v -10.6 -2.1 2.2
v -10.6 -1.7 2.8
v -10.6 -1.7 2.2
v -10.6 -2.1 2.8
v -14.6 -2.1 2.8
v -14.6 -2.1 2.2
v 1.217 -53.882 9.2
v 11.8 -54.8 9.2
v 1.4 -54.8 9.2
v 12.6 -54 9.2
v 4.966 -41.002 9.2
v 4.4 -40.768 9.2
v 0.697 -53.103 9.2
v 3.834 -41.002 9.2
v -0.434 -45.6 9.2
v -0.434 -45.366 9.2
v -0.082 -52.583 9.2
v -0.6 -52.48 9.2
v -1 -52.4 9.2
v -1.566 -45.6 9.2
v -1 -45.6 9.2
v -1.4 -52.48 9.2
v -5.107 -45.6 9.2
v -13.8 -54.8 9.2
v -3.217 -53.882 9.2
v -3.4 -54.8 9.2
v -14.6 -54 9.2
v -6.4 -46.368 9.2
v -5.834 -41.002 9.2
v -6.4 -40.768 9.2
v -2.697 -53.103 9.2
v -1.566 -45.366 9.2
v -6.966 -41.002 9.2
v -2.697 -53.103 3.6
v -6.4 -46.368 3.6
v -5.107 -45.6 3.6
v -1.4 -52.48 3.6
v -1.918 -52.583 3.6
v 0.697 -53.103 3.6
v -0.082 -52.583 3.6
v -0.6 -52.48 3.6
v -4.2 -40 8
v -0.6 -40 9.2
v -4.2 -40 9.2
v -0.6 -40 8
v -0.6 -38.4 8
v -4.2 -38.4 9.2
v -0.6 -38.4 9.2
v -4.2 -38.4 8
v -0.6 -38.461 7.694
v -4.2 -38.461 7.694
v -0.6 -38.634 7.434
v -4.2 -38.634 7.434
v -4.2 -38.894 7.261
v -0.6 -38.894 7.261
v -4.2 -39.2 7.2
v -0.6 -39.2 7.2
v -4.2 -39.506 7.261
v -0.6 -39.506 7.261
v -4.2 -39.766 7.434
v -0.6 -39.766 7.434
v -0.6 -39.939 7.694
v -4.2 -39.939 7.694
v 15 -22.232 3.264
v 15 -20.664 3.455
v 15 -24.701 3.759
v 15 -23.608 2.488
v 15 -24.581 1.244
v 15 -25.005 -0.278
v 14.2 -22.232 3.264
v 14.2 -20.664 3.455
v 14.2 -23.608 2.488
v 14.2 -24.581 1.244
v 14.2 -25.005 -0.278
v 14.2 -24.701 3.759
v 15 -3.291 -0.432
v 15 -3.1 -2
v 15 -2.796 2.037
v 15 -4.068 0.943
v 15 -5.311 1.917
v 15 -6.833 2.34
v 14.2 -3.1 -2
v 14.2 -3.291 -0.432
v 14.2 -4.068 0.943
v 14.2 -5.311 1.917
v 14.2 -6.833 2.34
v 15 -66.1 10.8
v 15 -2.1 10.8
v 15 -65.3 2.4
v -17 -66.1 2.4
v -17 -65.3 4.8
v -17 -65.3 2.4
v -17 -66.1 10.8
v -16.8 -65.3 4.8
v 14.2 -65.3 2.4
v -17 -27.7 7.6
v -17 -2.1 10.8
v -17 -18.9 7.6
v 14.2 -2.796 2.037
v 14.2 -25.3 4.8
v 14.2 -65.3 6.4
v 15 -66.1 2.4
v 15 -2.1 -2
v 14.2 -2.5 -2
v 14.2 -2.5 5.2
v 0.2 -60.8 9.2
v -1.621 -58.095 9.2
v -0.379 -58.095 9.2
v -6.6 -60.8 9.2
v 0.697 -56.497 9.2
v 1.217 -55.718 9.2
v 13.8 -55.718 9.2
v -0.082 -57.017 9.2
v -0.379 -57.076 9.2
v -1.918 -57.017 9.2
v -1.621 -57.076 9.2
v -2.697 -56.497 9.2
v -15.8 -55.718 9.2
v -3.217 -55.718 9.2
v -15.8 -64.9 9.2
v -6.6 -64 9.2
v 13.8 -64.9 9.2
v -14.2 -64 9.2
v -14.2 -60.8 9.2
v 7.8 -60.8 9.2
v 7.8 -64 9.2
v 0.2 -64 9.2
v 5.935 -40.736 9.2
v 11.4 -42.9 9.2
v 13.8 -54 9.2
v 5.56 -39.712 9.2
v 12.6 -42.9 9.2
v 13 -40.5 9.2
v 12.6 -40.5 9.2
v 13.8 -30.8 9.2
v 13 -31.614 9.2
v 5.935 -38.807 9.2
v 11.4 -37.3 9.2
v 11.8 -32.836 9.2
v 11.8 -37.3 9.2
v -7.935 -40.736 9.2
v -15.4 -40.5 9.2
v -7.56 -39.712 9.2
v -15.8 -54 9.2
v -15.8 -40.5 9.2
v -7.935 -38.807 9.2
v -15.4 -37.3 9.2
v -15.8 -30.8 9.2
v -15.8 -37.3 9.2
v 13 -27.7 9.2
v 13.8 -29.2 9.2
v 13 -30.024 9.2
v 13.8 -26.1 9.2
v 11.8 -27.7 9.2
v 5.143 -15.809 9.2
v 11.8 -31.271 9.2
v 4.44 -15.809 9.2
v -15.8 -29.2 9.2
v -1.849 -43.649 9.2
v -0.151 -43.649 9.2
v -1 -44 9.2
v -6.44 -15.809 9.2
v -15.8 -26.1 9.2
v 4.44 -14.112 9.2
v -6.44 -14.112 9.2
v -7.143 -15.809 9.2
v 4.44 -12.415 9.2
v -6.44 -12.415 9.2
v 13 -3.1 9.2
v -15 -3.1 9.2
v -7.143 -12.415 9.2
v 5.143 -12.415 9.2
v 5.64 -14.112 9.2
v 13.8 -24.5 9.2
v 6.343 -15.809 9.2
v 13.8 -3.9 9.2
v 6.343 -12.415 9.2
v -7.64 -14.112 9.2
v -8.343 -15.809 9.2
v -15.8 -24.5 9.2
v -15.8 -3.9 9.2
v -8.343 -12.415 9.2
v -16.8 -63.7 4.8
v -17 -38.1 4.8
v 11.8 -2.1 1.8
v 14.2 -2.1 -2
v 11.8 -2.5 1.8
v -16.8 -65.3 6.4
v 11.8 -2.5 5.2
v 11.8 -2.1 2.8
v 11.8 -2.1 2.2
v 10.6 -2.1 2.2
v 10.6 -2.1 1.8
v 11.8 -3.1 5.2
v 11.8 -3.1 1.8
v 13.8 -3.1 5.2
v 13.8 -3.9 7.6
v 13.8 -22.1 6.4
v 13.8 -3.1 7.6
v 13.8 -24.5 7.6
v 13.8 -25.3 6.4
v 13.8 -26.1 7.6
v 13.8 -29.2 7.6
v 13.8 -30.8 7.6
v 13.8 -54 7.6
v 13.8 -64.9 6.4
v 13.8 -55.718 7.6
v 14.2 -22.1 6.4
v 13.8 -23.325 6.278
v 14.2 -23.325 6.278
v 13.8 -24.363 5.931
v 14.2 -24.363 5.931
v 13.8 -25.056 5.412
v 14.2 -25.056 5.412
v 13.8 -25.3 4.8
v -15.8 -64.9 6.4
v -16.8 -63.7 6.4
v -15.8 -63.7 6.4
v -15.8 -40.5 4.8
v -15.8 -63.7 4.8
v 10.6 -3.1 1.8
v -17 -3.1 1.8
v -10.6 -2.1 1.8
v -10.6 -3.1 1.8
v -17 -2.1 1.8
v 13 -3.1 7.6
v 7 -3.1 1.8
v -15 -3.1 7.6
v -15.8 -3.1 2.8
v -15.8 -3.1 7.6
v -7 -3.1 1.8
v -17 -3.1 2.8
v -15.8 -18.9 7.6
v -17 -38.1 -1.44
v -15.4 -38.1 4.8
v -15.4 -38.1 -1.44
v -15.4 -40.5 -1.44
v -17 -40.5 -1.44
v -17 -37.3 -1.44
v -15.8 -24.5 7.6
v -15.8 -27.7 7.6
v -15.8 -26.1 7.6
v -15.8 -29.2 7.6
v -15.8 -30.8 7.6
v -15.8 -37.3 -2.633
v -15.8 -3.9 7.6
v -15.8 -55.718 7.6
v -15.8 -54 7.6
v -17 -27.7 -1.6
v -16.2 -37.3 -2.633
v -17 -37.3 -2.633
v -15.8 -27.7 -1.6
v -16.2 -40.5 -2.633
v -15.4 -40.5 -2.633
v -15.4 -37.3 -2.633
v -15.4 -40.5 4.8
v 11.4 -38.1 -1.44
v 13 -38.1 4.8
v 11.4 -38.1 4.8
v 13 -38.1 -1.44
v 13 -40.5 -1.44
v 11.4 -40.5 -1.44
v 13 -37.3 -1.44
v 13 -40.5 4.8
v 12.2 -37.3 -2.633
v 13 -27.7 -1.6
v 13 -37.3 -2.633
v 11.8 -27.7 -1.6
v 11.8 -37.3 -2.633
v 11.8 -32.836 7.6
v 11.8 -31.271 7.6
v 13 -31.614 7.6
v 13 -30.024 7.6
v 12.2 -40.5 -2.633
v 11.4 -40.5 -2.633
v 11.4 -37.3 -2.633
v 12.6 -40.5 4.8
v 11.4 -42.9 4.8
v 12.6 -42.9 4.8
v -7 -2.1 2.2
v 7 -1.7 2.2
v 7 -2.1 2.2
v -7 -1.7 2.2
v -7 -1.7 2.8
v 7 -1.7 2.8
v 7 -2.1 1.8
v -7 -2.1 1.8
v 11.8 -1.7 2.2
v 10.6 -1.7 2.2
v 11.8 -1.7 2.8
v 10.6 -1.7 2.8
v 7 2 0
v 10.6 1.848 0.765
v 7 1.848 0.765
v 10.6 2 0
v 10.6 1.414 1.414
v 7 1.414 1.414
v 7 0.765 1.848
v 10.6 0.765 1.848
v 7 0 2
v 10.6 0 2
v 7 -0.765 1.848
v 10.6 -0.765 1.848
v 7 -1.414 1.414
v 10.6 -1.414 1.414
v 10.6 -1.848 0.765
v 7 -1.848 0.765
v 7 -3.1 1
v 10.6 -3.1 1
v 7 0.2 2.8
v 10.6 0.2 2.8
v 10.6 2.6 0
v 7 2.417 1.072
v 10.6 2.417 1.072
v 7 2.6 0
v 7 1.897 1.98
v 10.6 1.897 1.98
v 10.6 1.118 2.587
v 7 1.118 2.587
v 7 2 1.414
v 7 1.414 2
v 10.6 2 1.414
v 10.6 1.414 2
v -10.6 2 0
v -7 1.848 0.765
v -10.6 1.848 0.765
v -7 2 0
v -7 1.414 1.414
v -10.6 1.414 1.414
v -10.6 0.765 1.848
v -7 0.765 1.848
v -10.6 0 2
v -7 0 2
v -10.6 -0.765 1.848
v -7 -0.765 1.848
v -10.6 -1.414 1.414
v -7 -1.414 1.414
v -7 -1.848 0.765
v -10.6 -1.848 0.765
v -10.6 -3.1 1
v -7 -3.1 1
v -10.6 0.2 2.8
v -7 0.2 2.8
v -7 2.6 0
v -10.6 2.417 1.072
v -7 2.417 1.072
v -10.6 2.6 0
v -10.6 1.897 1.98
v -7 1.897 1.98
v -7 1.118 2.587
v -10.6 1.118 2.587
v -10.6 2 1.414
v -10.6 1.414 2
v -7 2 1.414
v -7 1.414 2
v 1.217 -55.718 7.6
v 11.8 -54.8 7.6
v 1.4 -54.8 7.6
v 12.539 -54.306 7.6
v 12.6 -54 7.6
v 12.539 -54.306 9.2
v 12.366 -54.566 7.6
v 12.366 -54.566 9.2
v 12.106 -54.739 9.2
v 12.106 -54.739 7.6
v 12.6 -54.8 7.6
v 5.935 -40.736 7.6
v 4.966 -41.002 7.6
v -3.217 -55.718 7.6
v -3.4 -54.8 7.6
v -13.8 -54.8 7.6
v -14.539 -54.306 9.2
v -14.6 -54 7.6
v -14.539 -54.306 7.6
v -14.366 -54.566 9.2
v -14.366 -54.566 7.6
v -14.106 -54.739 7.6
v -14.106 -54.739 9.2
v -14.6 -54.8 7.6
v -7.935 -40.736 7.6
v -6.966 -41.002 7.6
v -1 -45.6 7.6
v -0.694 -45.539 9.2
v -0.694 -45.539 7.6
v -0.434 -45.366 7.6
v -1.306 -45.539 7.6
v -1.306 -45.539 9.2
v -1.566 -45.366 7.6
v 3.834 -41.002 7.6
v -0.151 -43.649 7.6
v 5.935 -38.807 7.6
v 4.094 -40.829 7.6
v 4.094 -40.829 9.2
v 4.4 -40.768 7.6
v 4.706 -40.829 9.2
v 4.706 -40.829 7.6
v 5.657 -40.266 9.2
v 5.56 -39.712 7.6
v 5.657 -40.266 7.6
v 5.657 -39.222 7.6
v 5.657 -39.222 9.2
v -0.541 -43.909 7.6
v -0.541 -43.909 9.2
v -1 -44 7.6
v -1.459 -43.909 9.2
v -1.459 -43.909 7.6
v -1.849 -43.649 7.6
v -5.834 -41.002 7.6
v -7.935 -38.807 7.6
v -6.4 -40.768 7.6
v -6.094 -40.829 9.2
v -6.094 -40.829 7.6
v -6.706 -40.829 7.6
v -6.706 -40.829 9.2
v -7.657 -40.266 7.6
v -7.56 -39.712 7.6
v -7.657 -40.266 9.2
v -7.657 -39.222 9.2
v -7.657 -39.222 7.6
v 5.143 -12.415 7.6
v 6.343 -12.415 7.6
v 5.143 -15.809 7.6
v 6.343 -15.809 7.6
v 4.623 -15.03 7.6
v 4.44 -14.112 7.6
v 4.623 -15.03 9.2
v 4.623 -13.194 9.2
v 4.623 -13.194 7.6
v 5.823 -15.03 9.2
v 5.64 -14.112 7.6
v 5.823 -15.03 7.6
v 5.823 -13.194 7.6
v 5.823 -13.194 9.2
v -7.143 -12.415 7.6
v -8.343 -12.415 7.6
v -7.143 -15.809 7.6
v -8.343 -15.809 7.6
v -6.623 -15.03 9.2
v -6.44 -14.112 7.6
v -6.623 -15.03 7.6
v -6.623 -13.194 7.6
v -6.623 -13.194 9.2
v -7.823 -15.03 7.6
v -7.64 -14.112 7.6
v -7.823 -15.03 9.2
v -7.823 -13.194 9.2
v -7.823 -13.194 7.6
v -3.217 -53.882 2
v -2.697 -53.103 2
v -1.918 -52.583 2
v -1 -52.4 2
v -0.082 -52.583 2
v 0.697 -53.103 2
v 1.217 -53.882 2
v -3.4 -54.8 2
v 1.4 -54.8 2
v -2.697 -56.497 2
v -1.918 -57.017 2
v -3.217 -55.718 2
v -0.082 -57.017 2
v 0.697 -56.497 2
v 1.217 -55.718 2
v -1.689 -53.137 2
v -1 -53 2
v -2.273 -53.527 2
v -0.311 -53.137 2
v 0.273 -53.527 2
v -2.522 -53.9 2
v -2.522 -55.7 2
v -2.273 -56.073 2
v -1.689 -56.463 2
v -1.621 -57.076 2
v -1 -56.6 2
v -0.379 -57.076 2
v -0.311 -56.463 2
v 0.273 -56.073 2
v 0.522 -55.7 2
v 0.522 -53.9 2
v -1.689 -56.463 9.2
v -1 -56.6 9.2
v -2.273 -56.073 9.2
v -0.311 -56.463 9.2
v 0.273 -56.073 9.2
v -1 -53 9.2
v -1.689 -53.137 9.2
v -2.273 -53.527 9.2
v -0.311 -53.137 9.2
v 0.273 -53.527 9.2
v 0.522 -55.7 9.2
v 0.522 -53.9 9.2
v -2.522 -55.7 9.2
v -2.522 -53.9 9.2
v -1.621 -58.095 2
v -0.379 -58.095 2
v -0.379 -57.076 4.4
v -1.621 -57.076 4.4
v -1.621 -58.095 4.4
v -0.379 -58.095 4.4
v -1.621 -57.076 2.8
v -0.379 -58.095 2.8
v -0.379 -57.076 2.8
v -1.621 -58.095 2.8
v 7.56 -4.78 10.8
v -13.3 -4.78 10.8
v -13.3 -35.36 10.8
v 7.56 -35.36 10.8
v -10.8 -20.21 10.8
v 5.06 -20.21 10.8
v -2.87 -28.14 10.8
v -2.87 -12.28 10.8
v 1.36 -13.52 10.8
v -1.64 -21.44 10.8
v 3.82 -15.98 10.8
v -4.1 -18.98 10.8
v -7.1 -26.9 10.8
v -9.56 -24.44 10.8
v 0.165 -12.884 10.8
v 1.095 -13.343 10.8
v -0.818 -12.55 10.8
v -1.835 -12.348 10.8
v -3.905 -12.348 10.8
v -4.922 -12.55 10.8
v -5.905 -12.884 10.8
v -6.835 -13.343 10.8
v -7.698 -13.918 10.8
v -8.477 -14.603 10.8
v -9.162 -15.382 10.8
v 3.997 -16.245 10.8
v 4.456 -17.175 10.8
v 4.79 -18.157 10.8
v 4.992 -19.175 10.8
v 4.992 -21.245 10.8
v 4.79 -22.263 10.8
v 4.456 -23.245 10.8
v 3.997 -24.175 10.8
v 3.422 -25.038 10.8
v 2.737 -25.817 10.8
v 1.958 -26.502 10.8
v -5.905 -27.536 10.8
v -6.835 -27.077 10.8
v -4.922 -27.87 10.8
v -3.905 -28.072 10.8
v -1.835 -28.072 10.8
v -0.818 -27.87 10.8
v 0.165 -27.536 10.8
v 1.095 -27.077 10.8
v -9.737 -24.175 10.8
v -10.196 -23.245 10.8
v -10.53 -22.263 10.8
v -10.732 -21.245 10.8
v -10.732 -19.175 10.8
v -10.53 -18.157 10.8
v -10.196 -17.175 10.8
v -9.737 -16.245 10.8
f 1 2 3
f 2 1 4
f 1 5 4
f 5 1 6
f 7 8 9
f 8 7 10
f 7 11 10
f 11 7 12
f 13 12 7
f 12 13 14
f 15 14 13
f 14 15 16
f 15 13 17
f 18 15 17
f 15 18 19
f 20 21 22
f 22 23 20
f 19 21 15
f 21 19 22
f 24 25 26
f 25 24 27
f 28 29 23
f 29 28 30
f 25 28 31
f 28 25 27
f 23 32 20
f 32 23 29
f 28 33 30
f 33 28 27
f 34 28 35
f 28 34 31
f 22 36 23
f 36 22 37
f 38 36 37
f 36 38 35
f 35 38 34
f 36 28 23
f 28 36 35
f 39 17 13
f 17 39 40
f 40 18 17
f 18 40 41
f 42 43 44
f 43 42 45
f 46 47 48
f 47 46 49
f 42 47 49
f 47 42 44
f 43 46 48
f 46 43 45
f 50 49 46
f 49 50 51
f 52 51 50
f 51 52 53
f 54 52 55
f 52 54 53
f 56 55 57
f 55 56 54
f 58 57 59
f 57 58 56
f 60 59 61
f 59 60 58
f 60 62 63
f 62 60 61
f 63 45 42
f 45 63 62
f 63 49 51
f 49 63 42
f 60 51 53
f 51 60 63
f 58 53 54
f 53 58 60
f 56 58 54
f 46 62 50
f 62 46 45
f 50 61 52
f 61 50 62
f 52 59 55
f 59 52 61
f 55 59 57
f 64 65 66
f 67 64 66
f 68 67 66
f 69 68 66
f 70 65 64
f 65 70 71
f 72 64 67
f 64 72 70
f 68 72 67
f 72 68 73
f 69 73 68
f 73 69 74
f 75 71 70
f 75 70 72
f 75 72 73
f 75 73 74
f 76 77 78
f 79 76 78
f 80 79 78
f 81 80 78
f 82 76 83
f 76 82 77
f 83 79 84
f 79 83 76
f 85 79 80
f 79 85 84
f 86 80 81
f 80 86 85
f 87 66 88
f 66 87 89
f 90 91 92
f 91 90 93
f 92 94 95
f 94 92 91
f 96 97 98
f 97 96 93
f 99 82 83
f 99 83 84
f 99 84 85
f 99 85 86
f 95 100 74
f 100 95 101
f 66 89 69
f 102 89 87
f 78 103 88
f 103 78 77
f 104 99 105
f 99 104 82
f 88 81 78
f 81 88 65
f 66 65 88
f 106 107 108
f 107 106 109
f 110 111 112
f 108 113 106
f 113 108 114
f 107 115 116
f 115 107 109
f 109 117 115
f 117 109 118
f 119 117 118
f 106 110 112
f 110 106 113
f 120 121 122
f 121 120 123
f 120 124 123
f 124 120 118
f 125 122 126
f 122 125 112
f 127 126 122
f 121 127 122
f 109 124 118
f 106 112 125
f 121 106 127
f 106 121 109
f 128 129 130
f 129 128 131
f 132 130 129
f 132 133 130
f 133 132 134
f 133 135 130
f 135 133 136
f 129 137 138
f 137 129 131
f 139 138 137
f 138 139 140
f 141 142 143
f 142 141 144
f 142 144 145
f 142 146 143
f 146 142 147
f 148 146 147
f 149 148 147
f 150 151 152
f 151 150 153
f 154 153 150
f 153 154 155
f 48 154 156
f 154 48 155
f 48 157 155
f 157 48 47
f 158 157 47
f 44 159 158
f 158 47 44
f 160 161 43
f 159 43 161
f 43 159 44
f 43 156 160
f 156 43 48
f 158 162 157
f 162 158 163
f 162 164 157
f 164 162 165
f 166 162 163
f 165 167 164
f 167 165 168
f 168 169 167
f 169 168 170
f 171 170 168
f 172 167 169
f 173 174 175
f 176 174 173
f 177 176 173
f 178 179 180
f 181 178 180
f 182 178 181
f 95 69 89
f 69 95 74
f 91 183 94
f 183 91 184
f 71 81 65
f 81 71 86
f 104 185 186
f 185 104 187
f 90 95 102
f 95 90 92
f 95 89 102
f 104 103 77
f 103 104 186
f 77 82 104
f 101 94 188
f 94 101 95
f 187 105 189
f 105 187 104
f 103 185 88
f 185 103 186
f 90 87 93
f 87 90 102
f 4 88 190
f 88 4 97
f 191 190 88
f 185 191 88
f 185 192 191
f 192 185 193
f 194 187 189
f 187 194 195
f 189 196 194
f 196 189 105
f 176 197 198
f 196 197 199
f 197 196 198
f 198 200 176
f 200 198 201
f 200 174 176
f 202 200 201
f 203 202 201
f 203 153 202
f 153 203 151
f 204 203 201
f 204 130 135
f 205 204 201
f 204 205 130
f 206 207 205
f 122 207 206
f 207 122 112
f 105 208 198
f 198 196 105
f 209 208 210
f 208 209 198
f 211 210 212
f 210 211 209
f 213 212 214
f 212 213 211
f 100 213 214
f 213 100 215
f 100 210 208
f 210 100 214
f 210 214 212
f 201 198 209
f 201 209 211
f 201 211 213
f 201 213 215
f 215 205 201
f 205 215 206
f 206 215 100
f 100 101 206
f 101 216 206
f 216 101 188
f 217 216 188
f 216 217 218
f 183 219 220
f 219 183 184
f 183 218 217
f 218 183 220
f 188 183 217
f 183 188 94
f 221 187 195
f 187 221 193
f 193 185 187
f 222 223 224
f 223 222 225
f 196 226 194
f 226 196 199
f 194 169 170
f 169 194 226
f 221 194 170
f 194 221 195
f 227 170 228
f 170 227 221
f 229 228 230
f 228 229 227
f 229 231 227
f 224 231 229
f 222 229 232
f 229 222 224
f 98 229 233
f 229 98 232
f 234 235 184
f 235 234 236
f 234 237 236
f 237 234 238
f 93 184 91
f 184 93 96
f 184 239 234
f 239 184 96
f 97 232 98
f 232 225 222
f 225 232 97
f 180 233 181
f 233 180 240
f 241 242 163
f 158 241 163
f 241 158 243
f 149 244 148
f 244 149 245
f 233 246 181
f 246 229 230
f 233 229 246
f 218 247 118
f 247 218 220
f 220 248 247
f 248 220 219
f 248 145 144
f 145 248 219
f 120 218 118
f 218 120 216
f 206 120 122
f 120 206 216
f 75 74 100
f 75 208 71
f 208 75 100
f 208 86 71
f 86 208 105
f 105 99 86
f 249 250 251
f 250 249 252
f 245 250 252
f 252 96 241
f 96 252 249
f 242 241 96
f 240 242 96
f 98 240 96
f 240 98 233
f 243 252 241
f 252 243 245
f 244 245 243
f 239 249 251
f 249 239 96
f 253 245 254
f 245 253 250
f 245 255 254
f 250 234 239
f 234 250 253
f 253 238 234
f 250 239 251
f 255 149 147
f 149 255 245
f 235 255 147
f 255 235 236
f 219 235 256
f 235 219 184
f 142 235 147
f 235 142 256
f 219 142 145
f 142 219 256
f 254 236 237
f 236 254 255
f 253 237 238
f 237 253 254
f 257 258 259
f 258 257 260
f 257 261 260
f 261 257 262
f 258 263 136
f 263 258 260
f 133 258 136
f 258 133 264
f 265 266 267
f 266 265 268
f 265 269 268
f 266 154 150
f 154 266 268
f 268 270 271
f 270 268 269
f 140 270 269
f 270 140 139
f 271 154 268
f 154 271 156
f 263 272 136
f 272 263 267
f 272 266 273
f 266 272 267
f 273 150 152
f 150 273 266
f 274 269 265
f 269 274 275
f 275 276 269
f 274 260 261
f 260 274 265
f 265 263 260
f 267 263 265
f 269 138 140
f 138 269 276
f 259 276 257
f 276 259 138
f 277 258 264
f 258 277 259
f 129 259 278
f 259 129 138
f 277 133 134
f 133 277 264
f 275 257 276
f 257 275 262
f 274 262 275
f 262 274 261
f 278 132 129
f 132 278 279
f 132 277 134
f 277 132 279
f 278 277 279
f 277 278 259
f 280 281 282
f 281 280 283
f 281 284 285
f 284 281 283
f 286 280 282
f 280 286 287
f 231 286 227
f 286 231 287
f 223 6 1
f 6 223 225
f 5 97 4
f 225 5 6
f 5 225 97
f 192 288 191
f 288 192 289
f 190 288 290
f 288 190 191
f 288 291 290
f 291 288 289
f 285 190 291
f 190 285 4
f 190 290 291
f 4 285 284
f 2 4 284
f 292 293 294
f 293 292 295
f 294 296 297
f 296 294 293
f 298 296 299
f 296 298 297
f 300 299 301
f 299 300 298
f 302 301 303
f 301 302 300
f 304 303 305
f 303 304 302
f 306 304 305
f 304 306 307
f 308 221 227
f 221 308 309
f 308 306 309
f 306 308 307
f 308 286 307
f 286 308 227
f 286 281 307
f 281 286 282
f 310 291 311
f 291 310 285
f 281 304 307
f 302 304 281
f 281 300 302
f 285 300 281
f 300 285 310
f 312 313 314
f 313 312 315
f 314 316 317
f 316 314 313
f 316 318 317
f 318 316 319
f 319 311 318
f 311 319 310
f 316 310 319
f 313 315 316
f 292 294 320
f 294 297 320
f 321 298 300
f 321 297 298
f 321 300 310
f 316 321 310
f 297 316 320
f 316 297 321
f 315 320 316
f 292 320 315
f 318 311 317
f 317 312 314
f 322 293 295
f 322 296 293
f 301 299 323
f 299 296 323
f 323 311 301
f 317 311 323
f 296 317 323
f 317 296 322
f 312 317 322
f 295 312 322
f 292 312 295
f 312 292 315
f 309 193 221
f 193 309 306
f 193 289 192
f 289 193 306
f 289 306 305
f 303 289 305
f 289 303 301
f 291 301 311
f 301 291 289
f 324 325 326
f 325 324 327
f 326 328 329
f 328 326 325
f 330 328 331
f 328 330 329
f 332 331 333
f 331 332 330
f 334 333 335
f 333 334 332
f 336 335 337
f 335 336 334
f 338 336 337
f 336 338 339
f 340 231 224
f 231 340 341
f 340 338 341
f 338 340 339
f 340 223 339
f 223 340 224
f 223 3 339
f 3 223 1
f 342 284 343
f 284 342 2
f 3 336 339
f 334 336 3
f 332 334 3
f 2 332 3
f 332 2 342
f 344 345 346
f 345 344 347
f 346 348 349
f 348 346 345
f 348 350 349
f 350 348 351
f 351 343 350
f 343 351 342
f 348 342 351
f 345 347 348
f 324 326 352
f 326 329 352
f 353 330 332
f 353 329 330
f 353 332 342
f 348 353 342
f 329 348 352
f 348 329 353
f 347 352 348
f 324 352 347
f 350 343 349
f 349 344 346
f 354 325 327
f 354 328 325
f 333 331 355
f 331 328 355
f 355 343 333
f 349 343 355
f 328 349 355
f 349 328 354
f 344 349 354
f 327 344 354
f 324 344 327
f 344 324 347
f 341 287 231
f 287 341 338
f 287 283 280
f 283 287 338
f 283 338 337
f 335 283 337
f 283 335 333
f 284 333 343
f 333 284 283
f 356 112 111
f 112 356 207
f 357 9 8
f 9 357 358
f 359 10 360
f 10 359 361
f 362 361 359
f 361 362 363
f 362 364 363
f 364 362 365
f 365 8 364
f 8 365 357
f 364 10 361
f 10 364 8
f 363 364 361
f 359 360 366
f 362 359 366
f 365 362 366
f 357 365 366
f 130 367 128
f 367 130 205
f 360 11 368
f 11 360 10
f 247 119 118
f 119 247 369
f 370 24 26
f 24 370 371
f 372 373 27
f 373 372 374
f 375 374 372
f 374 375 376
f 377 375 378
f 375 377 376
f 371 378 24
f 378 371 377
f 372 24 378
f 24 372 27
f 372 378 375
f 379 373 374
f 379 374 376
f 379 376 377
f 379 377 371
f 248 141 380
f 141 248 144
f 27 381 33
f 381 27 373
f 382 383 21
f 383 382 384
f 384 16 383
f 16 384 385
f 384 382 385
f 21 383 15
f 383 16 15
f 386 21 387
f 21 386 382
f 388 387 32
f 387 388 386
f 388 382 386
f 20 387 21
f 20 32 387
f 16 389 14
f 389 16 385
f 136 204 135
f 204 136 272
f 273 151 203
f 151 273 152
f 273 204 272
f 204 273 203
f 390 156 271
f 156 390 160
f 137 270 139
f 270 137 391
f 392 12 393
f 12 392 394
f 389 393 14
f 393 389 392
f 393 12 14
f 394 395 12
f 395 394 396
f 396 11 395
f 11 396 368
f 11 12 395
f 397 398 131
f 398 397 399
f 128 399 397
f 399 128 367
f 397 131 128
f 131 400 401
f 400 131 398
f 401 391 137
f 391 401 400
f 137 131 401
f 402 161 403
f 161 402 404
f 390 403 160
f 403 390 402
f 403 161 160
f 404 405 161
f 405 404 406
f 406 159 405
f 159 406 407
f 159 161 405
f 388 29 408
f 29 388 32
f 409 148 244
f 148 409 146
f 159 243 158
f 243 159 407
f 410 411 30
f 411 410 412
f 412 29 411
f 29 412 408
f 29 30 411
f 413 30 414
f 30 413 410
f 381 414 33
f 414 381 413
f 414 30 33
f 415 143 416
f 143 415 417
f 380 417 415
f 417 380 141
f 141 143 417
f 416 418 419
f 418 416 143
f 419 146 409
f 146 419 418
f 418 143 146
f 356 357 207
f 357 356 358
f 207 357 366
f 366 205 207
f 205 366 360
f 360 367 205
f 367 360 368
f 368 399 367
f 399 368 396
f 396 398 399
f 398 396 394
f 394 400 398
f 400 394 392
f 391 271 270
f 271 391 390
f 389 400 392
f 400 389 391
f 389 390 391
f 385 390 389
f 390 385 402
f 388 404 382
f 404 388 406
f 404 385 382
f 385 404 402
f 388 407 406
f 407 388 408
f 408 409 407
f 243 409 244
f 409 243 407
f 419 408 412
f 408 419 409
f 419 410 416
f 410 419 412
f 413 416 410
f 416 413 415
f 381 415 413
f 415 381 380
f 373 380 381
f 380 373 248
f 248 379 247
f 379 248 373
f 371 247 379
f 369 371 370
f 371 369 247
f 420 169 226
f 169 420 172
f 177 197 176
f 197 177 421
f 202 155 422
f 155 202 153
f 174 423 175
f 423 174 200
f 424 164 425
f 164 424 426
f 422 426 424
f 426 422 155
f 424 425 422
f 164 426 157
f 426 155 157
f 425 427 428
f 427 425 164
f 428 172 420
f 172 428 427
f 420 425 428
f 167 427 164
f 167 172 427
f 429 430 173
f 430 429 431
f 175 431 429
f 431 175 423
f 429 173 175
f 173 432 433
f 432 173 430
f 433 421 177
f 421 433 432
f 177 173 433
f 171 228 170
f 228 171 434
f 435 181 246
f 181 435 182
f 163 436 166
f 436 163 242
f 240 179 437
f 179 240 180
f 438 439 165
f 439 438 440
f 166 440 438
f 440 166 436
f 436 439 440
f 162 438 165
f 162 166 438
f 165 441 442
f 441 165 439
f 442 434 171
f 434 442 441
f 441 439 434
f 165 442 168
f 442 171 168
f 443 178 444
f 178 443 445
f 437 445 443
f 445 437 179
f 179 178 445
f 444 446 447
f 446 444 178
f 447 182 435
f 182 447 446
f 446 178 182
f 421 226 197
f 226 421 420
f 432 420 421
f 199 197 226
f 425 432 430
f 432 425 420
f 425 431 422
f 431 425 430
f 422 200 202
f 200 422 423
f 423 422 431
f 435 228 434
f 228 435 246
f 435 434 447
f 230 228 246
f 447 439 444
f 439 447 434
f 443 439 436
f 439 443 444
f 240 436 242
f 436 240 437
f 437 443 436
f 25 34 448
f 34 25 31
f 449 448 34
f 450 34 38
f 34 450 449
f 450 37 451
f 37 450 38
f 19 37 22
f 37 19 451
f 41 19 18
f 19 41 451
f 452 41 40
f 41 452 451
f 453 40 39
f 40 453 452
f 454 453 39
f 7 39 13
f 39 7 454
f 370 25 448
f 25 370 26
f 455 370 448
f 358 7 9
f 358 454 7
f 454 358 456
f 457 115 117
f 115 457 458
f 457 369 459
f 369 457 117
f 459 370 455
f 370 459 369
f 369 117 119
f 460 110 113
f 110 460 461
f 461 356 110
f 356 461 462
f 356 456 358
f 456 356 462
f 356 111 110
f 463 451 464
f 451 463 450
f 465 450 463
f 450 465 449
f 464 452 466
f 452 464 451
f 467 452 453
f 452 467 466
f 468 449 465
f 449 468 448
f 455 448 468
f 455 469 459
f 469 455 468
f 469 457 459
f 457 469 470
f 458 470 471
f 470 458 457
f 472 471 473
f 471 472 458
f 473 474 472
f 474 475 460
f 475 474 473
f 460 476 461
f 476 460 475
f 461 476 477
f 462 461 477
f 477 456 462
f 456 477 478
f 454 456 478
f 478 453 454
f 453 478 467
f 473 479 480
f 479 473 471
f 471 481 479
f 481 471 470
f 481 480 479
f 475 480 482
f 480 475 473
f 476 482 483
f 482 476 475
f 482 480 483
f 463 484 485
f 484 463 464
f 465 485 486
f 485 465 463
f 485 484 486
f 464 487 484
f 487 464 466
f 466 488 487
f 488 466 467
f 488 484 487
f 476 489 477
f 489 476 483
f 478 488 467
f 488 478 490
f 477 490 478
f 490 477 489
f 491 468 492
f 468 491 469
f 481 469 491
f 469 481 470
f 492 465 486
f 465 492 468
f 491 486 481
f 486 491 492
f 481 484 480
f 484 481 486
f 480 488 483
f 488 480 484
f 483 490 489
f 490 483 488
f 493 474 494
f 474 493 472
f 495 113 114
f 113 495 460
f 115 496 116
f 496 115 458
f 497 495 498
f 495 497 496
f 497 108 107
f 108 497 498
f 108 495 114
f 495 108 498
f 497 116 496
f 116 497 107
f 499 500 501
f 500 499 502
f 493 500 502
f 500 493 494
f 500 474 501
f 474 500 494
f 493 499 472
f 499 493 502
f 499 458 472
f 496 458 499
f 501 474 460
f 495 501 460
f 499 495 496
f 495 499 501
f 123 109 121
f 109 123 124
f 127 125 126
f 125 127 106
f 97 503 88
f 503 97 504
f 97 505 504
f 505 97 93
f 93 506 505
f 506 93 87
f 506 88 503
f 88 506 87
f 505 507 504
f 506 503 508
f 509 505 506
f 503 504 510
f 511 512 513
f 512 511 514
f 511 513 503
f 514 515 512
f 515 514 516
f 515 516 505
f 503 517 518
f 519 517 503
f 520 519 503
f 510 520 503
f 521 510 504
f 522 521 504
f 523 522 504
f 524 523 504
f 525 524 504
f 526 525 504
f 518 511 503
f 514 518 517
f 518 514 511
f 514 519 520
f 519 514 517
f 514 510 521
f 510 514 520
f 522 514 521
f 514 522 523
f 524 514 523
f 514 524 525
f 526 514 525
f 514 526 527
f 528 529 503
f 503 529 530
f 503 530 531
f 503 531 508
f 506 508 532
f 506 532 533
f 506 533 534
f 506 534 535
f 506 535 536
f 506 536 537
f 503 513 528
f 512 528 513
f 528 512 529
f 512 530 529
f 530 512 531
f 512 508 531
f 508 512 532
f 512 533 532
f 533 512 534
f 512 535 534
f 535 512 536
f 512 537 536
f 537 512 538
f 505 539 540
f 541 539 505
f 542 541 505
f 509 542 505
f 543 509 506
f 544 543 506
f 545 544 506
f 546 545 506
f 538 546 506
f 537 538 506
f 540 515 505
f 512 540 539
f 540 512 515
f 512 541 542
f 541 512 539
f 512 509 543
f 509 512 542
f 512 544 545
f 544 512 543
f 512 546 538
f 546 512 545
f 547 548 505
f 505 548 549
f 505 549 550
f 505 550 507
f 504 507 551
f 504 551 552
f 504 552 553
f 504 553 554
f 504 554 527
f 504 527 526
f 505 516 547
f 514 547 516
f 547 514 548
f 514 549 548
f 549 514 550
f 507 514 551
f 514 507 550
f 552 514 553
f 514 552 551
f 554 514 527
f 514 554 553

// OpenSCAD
use <../lib.scad>
use <s/4111s01.scad>
use <s/4112s01.scad>
function ldraw_lib__4111p01() = [
// 0 ~Electric Switch: Key Right with Point Branching Pattern
// 0 Name: 4111p01.dat
// 0 Author: Javier Orquera [kuramapika1]
// 0 !LDRAW_ORG Part UPDATE 2025-09
// 0 !LICENSE Licensed under CC BY 4.0 : see CAreadme.txt
// 
// 0 !HELP to put this part into a pressed-down state, rotate it 4.3 degrees
// 0 !HELP around the x-axis
// 
// 0 BFC CERTIFY CCW
  [0,"BFC","CERTIFY"],
  [0,"BFC","CCW"],
// 
// 0 !KEYWORDS Set 1239, Set 5080, Set 7858, Set 7859, Set 7863, switch, Train
// 
// 0 !HISTORY 2025-04-24 [kuramapika1] Adapted surfaces
// 0 !HISTORY 2025-09-11 [kuramapika1] Use of new subfile
// 0 !HISTORY 2025-09-18 [kuramapika1] Merge vertexes to corners
// 0 !HISTORY 2025-09-29 [OrionP] Official Update 2025-09
// 
// 1 16 0 0 0 1 0 0 0 1 0 0 0 1 s\4111s01.dat
  [1,16,0,0,0,1,0,0,0,1,0,0,0,1, ldraw_lib__s__4111s01()],
// 1 16 0 0 0 -1 0 0 0 1 0 0 0 1 s\4112s01.dat
  [1,16,0,0,0,-1,0,0,0,1,0,0,0,1, ldraw_lib__s__4112s01()],
// 4 16 -42.5 -27 -5.25 -33.25 -27 -11.95 18.9 -27 -11.95 37.5 -27 -5.25
  [4,16,-42.5,-27,-5.25,-33.25,-27,-11.95,18.9,-27,-11.95,37.5,-27,-5.25],
// 4 16 -33.25 -27 -88.4 -33.25 -27 -11.95 -42.5 -27 -5.25 -42.5 -27 -165.25
  [4,16,-33.25,-27,-88.4,-33.25,-27,-11.95,-42.5,-27,-5.25,-42.5,-27,-165.25],
// 4 16 -33.25 -27 -88.4 -42.5 -27 -165.25 37.5 -27 -165.25 18.9 -27 -88.4
  [4,16,-33.25,-27,-88.4,-42.5,-27,-165.25,37.5,-27,-165.25,18.9,-27,-88.4],
// 4 16 37.5 -27 -165.25 37.5 -27 -5.25 18.9 -27 -11.95 18.9 -27 -88.4
  [4,16,37.5,-27,-165.25,37.5,-27,-5.25,18.9,-27,-11.95,18.9,-27,-88.4],
// 3 0 -33.25 -27 -88.4 -26.9994 -27 -50.525 -33.25 -27 -11.95
  [3,0,-33.25,-27,-88.4,-26.9994,-27,-50.525,-33.25,-27,-11.95],
// 3 0 18.9 -27 -88.4 18.9 -27 -11.95 12.6494 -27 -50.525
  [3,0,18.9,-27,-88.4,18.9,-27,-11.95,12.6494,-27,-50.525],
// 3 0 -7.175 -27 -70.35 -33.25 -27 -88.4 18.9 -27 -88.4
  [3,0,-7.175,-27,-70.35,-33.25,-27,-88.4,18.9,-27,-88.4],
// 3 0 18.9 -27 -11.95 -33.25 -27 -11.95 -7.175 -27 -30.7
  [3,0,18.9,-27,-11.95,-33.25,-27,-11.95,-7.175,-27,-30.7],
// 4 0 -10.25091 -27 -47.4491 -4.09909 -27 -53.6009 9.5509 -27 -39.9495 3.4 -27 -33.799
  [4,0,-10.25091,-27,-47.4491,-4.09909,-27,-53.6009,9.5509,-27,-39.9495,3.4,-27,-33.799],
// 3 0 3.4 -27 -33.799 9.5509 -27 -39.9495 18.9 -27 -11.95
  [3,0,3.4,-27,-33.799,9.5509,-27,-39.9495,18.9,-27,-11.95],
// 4 0 -4.09909 -27 -53.6009 -10.25091 -27 -47.4491 -23.9009 -27 -61.1005 -17.75 -27 -67.251
  [4,0,-4.09909,-27,-53.6009,-10.25091,-27,-47.4491,-23.9009,-27,-61.1005,-17.75,-27,-67.251],
// 3 0 -17.75 -27 -67.251 -23.9009 -27 -61.1005 -33.25 -27 -88.4
  [3,0,-17.75,-27,-67.251,-23.9009,-27,-61.1005,-33.25,-27,-88.4],
// 3 0 18.9 -27 -11.95 .41204 -27 -32.209 2.73804 -27 -33.357
  [3,0,18.9,-27,-11.95,.41204,-27,-32.209,2.73804,-27,-33.357],
// 3 0 -2.04395 -27 -31.376 .41204 -27 -32.209 18.9 -27 -11.95
  [3,0,-2.04395,-27,-31.376,.41204,-27,-32.209,18.9,-27,-11.95],
// 3 0 -4.58798 -27 -30.87 -2.04395 -27 -31.376 18.9 -27 -11.95
  [3,0,-4.58798,-27,-30.87,-2.04395,-27,-31.376,18.9,-27,-11.95],
// 3 0 -7.175 -27 -30.7 -4.58798 -27 -30.87 18.9 -27 -11.95
  [3,0,-7.175,-27,-30.7,-4.58798,-27,-30.87,18.9,-27,-11.95],
// 3 0 -9.76202 -27 -30.87 -7.175 -27 -30.7 -33.25 -27 -11.95
  [3,0,-9.76202,-27,-30.87,-7.175,-27,-30.7,-33.25,-27,-11.95],
// 3 0 -12.30605 -27 -31.376 -9.76202 -27 -30.87 -33.25 -27 -11.95
  [3,0,-12.30605,-27,-31.376,-9.76202,-27,-30.87,-33.25,-27,-11.95],
// 3 0 -14.762 -27 -32.209 -12.30605 -27 -31.376 -33.25 -27 -11.95
  [3,0,-14.762,-27,-32.209,-12.30605,-27,-31.376,-33.25,-27,-11.95],
// 3 0 -17.087 -27 -33.3569 -14.762 -27 -32.209 -33.25 -27 -11.95
  [3,0,-17.087,-27,-33.3569,-14.762,-27,-32.209,-33.25,-27,-11.95],
// 3 0 -19.244 -27 -34.796 -17.087 -27 -33.3569 -33.25 -27 -11.95
  [3,0,-19.244,-27,-34.796,-17.087,-27,-33.3569,-33.25,-27,-11.95],
// 3 0 -21.193 -27 -36.507 -19.244 -27 -34.796 -33.25 -27 -11.95
  [3,0,-21.193,-27,-36.507,-19.244,-27,-34.796,-33.25,-27,-11.95],
// 3 0 2.73804 -27 -33.357 3.4 -27 -33.799 18.9 -27 -11.95
  [3,0,2.73804,-27,-33.357,3.4,-27,-33.799,18.9,-27,-11.95],
// 4 15 -10.25091 -27 -47.4491 3.4 -27 -33.799 2.73804 -27 -33.357 .41204 -27 -32.209
  [4,15,-10.25091,-27,-47.4491,3.4,-27,-33.799,2.73804,-27,-33.357,.41204,-27,-32.209],
// 4 15 -10.25091 -27 -47.4491 .41204 -27 -32.209 -2.04395 -27 -31.376 -4.58798 -27 -30.87
  [4,15,-10.25091,-27,-47.4491,.41204,-27,-32.209,-2.04395,-27,-31.376,-4.58798,-27,-30.87],
// 4 15 -10.25091 -27 -47.4491 -4.58798 -27 -30.87 -7.175 -27 -30.7 -9.76202 -27 -30.87
  [4,15,-10.25091,-27,-47.4491,-4.58798,-27,-30.87,-7.175,-27,-30.7,-9.76202,-27,-30.87],
// 4 15 -10.25091 -27 -47.4491 -9.76202 -27 -30.87 -12.30605 -27 -31.376 -14.762 -27 -32.209
  [4,15,-10.25091,-27,-47.4491,-9.76202,-27,-30.87,-12.30605,-27,-31.376,-14.762,-27,-32.209],
// 4 15 -10.25091 -27 -47.4491 -14.762 -27 -32.209 -17.087 -27 -33.3569 -19.244 -27 -34.796
  [4,15,-10.25091,-27,-47.4491,-14.762,-27,-32.209,-17.087,-27,-33.3569,-19.244,-27,-34.796],
// 4 15 -10.25091 -27 -47.4491 -19.244 -27 -34.796 -21.193 -27 -36.507 -22.9039 -27 -38.4561
  [4,15,-10.25091,-27,-47.4491,-19.244,-27,-34.796,-21.193,-27,-36.507,-22.9039,-27,-38.4561],
// 3 0 9.9928 -27 -40.6121 11.1412 -27 -42.9385 18.9 -27 -11.95
  [3,0,9.9928,-27,-40.6121,11.1412,-27,-42.9385,18.9,-27,-11.95],
// 3 0 18.9 -27 -11.95 11.1412 -27 -42.9385 11.9742 -27 -45.3935
  [3,0,18.9,-27,-11.95,11.1412,-27,-42.9385,11.9742,-27,-45.3935],
// 3 0 18.9 -27 -11.95 11.9742 -27 -45.3935 12.4804 -27 -47.9377
  [3,0,18.9,-27,-11.95,11.9742,-27,-45.3935,12.4804,-27,-47.9377],
// 3 0 18.9 -27 -11.95 12.4804 -27 -47.9377 12.6494 -27 -50.525
  [3,0,18.9,-27,-11.95,12.4804,-27,-47.9377,12.6494,-27,-50.525],
// 3 0 18.9 -27 -88.4 12.6494 -27 -50.525 12.4797 -27 -53.1116
  [3,0,18.9,-27,-88.4,12.6494,-27,-50.525,12.4797,-27,-53.1116],
// 3 0 18.9 -27 -88.4 12.4797 -27 -53.1116 11.9742 -27 -55.6565
  [3,0,18.9,-27,-88.4,12.4797,-27,-53.1116,11.9742,-27,-55.6565],
// 3 0 18.9 -27 -88.4 11.9742 -27 -55.6565 11.1412 -27 -58.1115
  [3,0,18.9,-27,-88.4,11.9742,-27,-55.6565,11.1412,-27,-58.1115],
// 3 0 18.9 -27 -88.4 11.1412 -27 -58.1115 9.9928 -27 -60.4365
  [3,0,18.9,-27,-88.4,11.1412,-27,-58.1115,9.9928,-27,-60.4365],
// 3 0 18.9 -27 -88.4 9.9928 -27 -60.4365 8.5539 -27 -62.5939
  [3,0,18.9,-27,-88.4,9.9928,-27,-60.4365,8.5539,-27,-62.5939],
// 3 0 18.9 -27 -88.4 8.5539 -27 -62.5939 6.84268 -27 -64.5427
  [3,0,18.9,-27,-88.4,8.5539,-27,-62.5939,6.84268,-27,-64.5427],
// 3 0 18.9 -27 -11.95 9.5509 -27 -39.9495 9.9928 -27 -40.6121
  [3,0,18.9,-27,-11.95,9.5509,-27,-39.9495,9.9928,-27,-40.6121],
// 4 15 9.9928 -27 -40.6121 9.5509 -27 -39.9495 -4.09909 -27 -53.6009 11.1412 -27 -42.9385
  [4,15,9.9928,-27,-40.6121,9.5509,-27,-39.9495,-4.09909,-27,-53.6009,11.1412,-27,-42.9385],
// 4 15 11.9742 -27 -45.3935 11.1412 -27 -42.9385 -4.09909 -27 -53.6009 12.4804 -27 -47.9377
  [4,15,11.9742,-27,-45.3935,11.1412,-27,-42.9385,-4.09909,-27,-53.6009,12.4804,-27,-47.9377],
// 4 15 12.6494 -27 -50.525 12.4804 -27 -47.9377 -4.09909 -27 -53.6009 12.4797 -27 -53.1116
  [4,15,12.6494,-27,-50.525,12.4804,-27,-47.9377,-4.09909,-27,-53.6009,12.4797,-27,-53.1116],
// 4 15 11.9742 -27 -55.6565 12.4797 -27 -53.1116 -4.09909 -27 -53.6009 11.1412 -27 -58.1115
  [4,15,11.9742,-27,-55.6565,12.4797,-27,-53.1116,-4.09909,-27,-53.6009,11.1412,-27,-58.1115],
// 4 15 9.9928 -27 -60.4365 11.1412 -27 -58.1115 -4.09909 -27 -53.6009 8.5539 -27 -62.5939
  [4,15,9.9928,-27,-60.4365,11.1412,-27,-58.1115,-4.09909,-27,-53.6009,8.5539,-27,-62.5939],
// 4 15 6.84268 -27 -64.5427 8.5539 -27 -62.5939 -4.09909 -27 -53.6009 4.89404 -27 -66.254
  [4,15,6.84268,-27,-64.5427,8.5539,-27,-62.5939,-4.09909,-27,-53.6009,4.89404,-27,-66.254],
// 3 0 -33.25 -27 -88.4 -14.762 -27 -68.841 -17.088 -27 -67.693
  [3,0,-33.25,-27,-88.4,-14.762,-27,-68.841,-17.088,-27,-67.693],
// 3 0 -12.30605 -27 -69.674 -14.762 -27 -68.841 -33.25 -27 -88.4
  [3,0,-12.30605,-27,-69.674,-14.762,-27,-68.841,-33.25,-27,-88.4],
// 3 0 -9.76202 -27 -70.18 -12.30605 -27 -69.674 -33.25 -27 -88.4
  [3,0,-9.76202,-27,-70.18,-12.30605,-27,-69.674,-33.25,-27,-88.4],
// 3 0 -7.175 -27 -70.35 -9.76202 -27 -70.18 -33.25 -27 -88.4
  [3,0,-7.175,-27,-70.35,-9.76202,-27,-70.18,-33.25,-27,-88.4],
// 3 0 -4.58798 -27 -70.18 -7.175 -27 -70.35 18.9 -27 -88.4
  [3,0,-4.58798,-27,-70.18,-7.175,-27,-70.35,18.9,-27,-88.4],
// 3 0 -2.04395 -27 -69.674 -4.58798 -27 -70.18 18.9 -27 -88.4
  [3,0,-2.04395,-27,-69.674,-4.58798,-27,-70.18,18.9,-27,-88.4],
// 3 0 .41204 -27 -68.841 -2.04395 -27 -69.674 18.9 -27 -88.4
  [3,0,.41204,-27,-68.841,-2.04395,-27,-69.674,18.9,-27,-88.4],
// 3 0 2.73701 -27 -67.6931 .41204 -27 -68.841 18.9 -27 -88.4
  [3,0,2.73701,-27,-67.6931,.41204,-27,-68.841,18.9,-27,-88.4],
// 3 0 4.89404 -27 -66.254 2.73701 -27 -67.6931 18.9 -27 -88.4
  [3,0,4.89404,-27,-66.254,2.73701,-27,-67.6931,18.9,-27,-88.4],
// 3 0 6.84268 -27 -64.5427 4.89404 -27 -66.254 18.9 -27 -88.4
  [3,0,6.84268,-27,-64.5427,4.89404,-27,-66.254,18.9,-27,-88.4],
// 3 0 -17.088 -27 -67.693 -17.75 -27 -67.251 -33.25 -27 -88.4
  [3,0,-17.088,-27,-67.693,-17.75,-27,-67.251,-33.25,-27,-88.4],
// 4 15 -4.09909 -27 -53.6009 -17.75 -27 -67.251 -17.088 -27 -67.693 -14.762 -27 -68.841
  [4,15,-4.09909,-27,-53.6009,-17.75,-27,-67.251,-17.088,-27,-67.693,-14.762,-27,-68.841],
// 4 15 -4.09909 -27 -53.6009 -14.762 -27 -68.841 -12.30605 -27 -69.674 -9.76202 -27 -70.18
  [4,15,-4.09909,-27,-53.6009,-14.762,-27,-68.841,-12.30605,-27,-69.674,-9.76202,-27,-70.18],
// 4 15 -4.09909 -27 -53.6009 -9.76202 -27 -70.18 -7.175 -27 -70.35 -4.58798 -27 -70.18
  [4,15,-4.09909,-27,-53.6009,-9.76202,-27,-70.18,-7.175,-27,-70.35,-4.58798,-27,-70.18],
// 4 15 -4.09909 -27 -53.6009 -4.58798 -27 -70.18 -2.04395 -27 -69.674 .41204 -27 -68.841
  [4,15,-4.09909,-27,-53.6009,-4.58798,-27,-70.18,-2.04395,-27,-69.674,.41204,-27,-68.841],
// 4 15 -4.09909 -27 -53.6009 .41204 -27 -68.841 2.73701 -27 -67.6931 4.89404 -27 -66.254
  [4,15,-4.09909,-27,-53.6009,.41204,-27,-68.841,2.73701,-27,-67.6931,4.89404,-27,-66.254],
// 3 0 -24.3428 -27 -60.4379 -25.4905 -27 -58.1123 -33.25 -27 -88.4
  [3,0,-24.3428,-27,-60.4379,-25.4905,-27,-58.1123,-33.25,-27,-88.4],
// 3 0 -33.25 -27 -88.4 -25.4905 -27 -58.1123 -26.3242 -27 -55.6565
  [3,0,-33.25,-27,-88.4,-25.4905,-27,-58.1123,-26.3242,-27,-55.6565],
// 3 0 -33.25 -27 -88.4 -26.3242 -27 -55.6565 -26.8297 -27 -53.1116
  [3,0,-33.25,-27,-88.4,-26.3242,-27,-55.6565,-26.8297,-27,-53.1116],
// 3 0 -33.25 -27 -88.4 -26.8297 -27 -53.1116 -26.9994 -27 -50.525
  [3,0,-33.25,-27,-88.4,-26.8297,-27,-53.1116,-26.9994,-27,-50.525],
// 3 0 -33.25 -27 -11.95 -26.9994 -27 -50.525 -26.8297 -27 -47.9384
  [3,0,-33.25,-27,-11.95,-26.9994,-27,-50.525,-26.8297,-27,-47.9384],
// 3 0 -33.25 -27 -11.95 -26.8297 -27 -47.9384 -26.3242 -27 -45.3935
  [3,0,-33.25,-27,-11.95,-26.8297,-27,-47.9384,-26.3242,-27,-45.3935],
// 3 0 -33.25 -27 -11.95 -26.3242 -27 -45.3935 -25.4905 -27 -42.9377
  [3,0,-33.25,-27,-11.95,-26.3242,-27,-45.3935,-25.4905,-27,-42.9377],
// 3 0 -33.25 -27 -11.95 -25.4905 -27 -42.9377 -24.3428 -27 -40.6135
  [3,0,-33.25,-27,-11.95,-25.4905,-27,-42.9377,-24.3428,-27,-40.6135],
// 3 0 -33.25 -27 -11.95 -24.3428 -27 -40.6135 -22.9039 -27 -38.4561
  [3,0,-33.25,-27,-11.95,-24.3428,-27,-40.6135,-22.9039,-27,-38.4561],
// 3 0 -33.25 -27 -11.95 -22.9039 -27 -38.4561 -21.193 -27 -36.507
  [3,0,-33.25,-27,-11.95,-22.9039,-27,-38.4561,-21.193,-27,-36.507],
// 3 0 -33.25 -27 -88.4 -23.9009 -27 -61.1005 -24.3428 -27 -60.4379
  [3,0,-33.25,-27,-88.4,-23.9009,-27,-61.1005,-24.3428,-27,-60.4379],
// 4 15 -24.3428 -27 -60.4379 -23.9009 -27 -61.1005 -10.25091 -27 -47.4491 -25.4905 -27 -58.1123
  [4,15,-24.3428,-27,-60.4379,-23.9009,-27,-61.1005,-10.25091,-27,-47.4491,-25.4905,-27,-58.1123],
// 4 15 -26.3242 -27 -55.6565 -25.4905 -27 -58.1123 -10.25091 -27 -47.4491 -26.8297 -27 -53.1116
  [4,15,-26.3242,-27,-55.6565,-25.4905,-27,-58.1123,-10.25091,-27,-47.4491,-26.8297,-27,-53.1116],
// 4 15 -26.9994 -27 -50.525 -26.8297 -27 -53.1116 -10.25091 -27 -47.4491 -26.8297 -27 -47.9384
  [4,15,-26.9994,-27,-50.525,-26.8297,-27,-53.1116,-10.25091,-27,-47.4491,-26.8297,-27,-47.9384],
// 4 15 -26.3242 -27 -45.3935 -26.8297 -27 -47.9384 -10.25091 -27 -47.4491 -25.4905 -27 -42.9377
  [4,15,-26.3242,-27,-45.3935,-26.8297,-27,-47.9384,-10.25091,-27,-47.4491,-25.4905,-27,-42.9377],
// 4 15 -24.3428 -27 -40.6135 -25.4905 -27 -42.9377 -10.25091 -27 -47.4491 -22.9039 -27 -38.4561
  [4,15,-24.3428,-27,-40.6135,-25.4905,-27,-42.9377,-10.25091,-27,-47.4491,-22.9039,-27,-38.4561],
];
module ldraw_lib__4111p01(step=0, col=false, unit=2/5, alt=false, line=0.2, solid=!$preview)
    makepoly(ldraw_lib__4111p01(), step=step, col=col, unit=unit, alt=alt, line=line, solid=solid);
ldraw_lib__4111p01(line=0.2);
